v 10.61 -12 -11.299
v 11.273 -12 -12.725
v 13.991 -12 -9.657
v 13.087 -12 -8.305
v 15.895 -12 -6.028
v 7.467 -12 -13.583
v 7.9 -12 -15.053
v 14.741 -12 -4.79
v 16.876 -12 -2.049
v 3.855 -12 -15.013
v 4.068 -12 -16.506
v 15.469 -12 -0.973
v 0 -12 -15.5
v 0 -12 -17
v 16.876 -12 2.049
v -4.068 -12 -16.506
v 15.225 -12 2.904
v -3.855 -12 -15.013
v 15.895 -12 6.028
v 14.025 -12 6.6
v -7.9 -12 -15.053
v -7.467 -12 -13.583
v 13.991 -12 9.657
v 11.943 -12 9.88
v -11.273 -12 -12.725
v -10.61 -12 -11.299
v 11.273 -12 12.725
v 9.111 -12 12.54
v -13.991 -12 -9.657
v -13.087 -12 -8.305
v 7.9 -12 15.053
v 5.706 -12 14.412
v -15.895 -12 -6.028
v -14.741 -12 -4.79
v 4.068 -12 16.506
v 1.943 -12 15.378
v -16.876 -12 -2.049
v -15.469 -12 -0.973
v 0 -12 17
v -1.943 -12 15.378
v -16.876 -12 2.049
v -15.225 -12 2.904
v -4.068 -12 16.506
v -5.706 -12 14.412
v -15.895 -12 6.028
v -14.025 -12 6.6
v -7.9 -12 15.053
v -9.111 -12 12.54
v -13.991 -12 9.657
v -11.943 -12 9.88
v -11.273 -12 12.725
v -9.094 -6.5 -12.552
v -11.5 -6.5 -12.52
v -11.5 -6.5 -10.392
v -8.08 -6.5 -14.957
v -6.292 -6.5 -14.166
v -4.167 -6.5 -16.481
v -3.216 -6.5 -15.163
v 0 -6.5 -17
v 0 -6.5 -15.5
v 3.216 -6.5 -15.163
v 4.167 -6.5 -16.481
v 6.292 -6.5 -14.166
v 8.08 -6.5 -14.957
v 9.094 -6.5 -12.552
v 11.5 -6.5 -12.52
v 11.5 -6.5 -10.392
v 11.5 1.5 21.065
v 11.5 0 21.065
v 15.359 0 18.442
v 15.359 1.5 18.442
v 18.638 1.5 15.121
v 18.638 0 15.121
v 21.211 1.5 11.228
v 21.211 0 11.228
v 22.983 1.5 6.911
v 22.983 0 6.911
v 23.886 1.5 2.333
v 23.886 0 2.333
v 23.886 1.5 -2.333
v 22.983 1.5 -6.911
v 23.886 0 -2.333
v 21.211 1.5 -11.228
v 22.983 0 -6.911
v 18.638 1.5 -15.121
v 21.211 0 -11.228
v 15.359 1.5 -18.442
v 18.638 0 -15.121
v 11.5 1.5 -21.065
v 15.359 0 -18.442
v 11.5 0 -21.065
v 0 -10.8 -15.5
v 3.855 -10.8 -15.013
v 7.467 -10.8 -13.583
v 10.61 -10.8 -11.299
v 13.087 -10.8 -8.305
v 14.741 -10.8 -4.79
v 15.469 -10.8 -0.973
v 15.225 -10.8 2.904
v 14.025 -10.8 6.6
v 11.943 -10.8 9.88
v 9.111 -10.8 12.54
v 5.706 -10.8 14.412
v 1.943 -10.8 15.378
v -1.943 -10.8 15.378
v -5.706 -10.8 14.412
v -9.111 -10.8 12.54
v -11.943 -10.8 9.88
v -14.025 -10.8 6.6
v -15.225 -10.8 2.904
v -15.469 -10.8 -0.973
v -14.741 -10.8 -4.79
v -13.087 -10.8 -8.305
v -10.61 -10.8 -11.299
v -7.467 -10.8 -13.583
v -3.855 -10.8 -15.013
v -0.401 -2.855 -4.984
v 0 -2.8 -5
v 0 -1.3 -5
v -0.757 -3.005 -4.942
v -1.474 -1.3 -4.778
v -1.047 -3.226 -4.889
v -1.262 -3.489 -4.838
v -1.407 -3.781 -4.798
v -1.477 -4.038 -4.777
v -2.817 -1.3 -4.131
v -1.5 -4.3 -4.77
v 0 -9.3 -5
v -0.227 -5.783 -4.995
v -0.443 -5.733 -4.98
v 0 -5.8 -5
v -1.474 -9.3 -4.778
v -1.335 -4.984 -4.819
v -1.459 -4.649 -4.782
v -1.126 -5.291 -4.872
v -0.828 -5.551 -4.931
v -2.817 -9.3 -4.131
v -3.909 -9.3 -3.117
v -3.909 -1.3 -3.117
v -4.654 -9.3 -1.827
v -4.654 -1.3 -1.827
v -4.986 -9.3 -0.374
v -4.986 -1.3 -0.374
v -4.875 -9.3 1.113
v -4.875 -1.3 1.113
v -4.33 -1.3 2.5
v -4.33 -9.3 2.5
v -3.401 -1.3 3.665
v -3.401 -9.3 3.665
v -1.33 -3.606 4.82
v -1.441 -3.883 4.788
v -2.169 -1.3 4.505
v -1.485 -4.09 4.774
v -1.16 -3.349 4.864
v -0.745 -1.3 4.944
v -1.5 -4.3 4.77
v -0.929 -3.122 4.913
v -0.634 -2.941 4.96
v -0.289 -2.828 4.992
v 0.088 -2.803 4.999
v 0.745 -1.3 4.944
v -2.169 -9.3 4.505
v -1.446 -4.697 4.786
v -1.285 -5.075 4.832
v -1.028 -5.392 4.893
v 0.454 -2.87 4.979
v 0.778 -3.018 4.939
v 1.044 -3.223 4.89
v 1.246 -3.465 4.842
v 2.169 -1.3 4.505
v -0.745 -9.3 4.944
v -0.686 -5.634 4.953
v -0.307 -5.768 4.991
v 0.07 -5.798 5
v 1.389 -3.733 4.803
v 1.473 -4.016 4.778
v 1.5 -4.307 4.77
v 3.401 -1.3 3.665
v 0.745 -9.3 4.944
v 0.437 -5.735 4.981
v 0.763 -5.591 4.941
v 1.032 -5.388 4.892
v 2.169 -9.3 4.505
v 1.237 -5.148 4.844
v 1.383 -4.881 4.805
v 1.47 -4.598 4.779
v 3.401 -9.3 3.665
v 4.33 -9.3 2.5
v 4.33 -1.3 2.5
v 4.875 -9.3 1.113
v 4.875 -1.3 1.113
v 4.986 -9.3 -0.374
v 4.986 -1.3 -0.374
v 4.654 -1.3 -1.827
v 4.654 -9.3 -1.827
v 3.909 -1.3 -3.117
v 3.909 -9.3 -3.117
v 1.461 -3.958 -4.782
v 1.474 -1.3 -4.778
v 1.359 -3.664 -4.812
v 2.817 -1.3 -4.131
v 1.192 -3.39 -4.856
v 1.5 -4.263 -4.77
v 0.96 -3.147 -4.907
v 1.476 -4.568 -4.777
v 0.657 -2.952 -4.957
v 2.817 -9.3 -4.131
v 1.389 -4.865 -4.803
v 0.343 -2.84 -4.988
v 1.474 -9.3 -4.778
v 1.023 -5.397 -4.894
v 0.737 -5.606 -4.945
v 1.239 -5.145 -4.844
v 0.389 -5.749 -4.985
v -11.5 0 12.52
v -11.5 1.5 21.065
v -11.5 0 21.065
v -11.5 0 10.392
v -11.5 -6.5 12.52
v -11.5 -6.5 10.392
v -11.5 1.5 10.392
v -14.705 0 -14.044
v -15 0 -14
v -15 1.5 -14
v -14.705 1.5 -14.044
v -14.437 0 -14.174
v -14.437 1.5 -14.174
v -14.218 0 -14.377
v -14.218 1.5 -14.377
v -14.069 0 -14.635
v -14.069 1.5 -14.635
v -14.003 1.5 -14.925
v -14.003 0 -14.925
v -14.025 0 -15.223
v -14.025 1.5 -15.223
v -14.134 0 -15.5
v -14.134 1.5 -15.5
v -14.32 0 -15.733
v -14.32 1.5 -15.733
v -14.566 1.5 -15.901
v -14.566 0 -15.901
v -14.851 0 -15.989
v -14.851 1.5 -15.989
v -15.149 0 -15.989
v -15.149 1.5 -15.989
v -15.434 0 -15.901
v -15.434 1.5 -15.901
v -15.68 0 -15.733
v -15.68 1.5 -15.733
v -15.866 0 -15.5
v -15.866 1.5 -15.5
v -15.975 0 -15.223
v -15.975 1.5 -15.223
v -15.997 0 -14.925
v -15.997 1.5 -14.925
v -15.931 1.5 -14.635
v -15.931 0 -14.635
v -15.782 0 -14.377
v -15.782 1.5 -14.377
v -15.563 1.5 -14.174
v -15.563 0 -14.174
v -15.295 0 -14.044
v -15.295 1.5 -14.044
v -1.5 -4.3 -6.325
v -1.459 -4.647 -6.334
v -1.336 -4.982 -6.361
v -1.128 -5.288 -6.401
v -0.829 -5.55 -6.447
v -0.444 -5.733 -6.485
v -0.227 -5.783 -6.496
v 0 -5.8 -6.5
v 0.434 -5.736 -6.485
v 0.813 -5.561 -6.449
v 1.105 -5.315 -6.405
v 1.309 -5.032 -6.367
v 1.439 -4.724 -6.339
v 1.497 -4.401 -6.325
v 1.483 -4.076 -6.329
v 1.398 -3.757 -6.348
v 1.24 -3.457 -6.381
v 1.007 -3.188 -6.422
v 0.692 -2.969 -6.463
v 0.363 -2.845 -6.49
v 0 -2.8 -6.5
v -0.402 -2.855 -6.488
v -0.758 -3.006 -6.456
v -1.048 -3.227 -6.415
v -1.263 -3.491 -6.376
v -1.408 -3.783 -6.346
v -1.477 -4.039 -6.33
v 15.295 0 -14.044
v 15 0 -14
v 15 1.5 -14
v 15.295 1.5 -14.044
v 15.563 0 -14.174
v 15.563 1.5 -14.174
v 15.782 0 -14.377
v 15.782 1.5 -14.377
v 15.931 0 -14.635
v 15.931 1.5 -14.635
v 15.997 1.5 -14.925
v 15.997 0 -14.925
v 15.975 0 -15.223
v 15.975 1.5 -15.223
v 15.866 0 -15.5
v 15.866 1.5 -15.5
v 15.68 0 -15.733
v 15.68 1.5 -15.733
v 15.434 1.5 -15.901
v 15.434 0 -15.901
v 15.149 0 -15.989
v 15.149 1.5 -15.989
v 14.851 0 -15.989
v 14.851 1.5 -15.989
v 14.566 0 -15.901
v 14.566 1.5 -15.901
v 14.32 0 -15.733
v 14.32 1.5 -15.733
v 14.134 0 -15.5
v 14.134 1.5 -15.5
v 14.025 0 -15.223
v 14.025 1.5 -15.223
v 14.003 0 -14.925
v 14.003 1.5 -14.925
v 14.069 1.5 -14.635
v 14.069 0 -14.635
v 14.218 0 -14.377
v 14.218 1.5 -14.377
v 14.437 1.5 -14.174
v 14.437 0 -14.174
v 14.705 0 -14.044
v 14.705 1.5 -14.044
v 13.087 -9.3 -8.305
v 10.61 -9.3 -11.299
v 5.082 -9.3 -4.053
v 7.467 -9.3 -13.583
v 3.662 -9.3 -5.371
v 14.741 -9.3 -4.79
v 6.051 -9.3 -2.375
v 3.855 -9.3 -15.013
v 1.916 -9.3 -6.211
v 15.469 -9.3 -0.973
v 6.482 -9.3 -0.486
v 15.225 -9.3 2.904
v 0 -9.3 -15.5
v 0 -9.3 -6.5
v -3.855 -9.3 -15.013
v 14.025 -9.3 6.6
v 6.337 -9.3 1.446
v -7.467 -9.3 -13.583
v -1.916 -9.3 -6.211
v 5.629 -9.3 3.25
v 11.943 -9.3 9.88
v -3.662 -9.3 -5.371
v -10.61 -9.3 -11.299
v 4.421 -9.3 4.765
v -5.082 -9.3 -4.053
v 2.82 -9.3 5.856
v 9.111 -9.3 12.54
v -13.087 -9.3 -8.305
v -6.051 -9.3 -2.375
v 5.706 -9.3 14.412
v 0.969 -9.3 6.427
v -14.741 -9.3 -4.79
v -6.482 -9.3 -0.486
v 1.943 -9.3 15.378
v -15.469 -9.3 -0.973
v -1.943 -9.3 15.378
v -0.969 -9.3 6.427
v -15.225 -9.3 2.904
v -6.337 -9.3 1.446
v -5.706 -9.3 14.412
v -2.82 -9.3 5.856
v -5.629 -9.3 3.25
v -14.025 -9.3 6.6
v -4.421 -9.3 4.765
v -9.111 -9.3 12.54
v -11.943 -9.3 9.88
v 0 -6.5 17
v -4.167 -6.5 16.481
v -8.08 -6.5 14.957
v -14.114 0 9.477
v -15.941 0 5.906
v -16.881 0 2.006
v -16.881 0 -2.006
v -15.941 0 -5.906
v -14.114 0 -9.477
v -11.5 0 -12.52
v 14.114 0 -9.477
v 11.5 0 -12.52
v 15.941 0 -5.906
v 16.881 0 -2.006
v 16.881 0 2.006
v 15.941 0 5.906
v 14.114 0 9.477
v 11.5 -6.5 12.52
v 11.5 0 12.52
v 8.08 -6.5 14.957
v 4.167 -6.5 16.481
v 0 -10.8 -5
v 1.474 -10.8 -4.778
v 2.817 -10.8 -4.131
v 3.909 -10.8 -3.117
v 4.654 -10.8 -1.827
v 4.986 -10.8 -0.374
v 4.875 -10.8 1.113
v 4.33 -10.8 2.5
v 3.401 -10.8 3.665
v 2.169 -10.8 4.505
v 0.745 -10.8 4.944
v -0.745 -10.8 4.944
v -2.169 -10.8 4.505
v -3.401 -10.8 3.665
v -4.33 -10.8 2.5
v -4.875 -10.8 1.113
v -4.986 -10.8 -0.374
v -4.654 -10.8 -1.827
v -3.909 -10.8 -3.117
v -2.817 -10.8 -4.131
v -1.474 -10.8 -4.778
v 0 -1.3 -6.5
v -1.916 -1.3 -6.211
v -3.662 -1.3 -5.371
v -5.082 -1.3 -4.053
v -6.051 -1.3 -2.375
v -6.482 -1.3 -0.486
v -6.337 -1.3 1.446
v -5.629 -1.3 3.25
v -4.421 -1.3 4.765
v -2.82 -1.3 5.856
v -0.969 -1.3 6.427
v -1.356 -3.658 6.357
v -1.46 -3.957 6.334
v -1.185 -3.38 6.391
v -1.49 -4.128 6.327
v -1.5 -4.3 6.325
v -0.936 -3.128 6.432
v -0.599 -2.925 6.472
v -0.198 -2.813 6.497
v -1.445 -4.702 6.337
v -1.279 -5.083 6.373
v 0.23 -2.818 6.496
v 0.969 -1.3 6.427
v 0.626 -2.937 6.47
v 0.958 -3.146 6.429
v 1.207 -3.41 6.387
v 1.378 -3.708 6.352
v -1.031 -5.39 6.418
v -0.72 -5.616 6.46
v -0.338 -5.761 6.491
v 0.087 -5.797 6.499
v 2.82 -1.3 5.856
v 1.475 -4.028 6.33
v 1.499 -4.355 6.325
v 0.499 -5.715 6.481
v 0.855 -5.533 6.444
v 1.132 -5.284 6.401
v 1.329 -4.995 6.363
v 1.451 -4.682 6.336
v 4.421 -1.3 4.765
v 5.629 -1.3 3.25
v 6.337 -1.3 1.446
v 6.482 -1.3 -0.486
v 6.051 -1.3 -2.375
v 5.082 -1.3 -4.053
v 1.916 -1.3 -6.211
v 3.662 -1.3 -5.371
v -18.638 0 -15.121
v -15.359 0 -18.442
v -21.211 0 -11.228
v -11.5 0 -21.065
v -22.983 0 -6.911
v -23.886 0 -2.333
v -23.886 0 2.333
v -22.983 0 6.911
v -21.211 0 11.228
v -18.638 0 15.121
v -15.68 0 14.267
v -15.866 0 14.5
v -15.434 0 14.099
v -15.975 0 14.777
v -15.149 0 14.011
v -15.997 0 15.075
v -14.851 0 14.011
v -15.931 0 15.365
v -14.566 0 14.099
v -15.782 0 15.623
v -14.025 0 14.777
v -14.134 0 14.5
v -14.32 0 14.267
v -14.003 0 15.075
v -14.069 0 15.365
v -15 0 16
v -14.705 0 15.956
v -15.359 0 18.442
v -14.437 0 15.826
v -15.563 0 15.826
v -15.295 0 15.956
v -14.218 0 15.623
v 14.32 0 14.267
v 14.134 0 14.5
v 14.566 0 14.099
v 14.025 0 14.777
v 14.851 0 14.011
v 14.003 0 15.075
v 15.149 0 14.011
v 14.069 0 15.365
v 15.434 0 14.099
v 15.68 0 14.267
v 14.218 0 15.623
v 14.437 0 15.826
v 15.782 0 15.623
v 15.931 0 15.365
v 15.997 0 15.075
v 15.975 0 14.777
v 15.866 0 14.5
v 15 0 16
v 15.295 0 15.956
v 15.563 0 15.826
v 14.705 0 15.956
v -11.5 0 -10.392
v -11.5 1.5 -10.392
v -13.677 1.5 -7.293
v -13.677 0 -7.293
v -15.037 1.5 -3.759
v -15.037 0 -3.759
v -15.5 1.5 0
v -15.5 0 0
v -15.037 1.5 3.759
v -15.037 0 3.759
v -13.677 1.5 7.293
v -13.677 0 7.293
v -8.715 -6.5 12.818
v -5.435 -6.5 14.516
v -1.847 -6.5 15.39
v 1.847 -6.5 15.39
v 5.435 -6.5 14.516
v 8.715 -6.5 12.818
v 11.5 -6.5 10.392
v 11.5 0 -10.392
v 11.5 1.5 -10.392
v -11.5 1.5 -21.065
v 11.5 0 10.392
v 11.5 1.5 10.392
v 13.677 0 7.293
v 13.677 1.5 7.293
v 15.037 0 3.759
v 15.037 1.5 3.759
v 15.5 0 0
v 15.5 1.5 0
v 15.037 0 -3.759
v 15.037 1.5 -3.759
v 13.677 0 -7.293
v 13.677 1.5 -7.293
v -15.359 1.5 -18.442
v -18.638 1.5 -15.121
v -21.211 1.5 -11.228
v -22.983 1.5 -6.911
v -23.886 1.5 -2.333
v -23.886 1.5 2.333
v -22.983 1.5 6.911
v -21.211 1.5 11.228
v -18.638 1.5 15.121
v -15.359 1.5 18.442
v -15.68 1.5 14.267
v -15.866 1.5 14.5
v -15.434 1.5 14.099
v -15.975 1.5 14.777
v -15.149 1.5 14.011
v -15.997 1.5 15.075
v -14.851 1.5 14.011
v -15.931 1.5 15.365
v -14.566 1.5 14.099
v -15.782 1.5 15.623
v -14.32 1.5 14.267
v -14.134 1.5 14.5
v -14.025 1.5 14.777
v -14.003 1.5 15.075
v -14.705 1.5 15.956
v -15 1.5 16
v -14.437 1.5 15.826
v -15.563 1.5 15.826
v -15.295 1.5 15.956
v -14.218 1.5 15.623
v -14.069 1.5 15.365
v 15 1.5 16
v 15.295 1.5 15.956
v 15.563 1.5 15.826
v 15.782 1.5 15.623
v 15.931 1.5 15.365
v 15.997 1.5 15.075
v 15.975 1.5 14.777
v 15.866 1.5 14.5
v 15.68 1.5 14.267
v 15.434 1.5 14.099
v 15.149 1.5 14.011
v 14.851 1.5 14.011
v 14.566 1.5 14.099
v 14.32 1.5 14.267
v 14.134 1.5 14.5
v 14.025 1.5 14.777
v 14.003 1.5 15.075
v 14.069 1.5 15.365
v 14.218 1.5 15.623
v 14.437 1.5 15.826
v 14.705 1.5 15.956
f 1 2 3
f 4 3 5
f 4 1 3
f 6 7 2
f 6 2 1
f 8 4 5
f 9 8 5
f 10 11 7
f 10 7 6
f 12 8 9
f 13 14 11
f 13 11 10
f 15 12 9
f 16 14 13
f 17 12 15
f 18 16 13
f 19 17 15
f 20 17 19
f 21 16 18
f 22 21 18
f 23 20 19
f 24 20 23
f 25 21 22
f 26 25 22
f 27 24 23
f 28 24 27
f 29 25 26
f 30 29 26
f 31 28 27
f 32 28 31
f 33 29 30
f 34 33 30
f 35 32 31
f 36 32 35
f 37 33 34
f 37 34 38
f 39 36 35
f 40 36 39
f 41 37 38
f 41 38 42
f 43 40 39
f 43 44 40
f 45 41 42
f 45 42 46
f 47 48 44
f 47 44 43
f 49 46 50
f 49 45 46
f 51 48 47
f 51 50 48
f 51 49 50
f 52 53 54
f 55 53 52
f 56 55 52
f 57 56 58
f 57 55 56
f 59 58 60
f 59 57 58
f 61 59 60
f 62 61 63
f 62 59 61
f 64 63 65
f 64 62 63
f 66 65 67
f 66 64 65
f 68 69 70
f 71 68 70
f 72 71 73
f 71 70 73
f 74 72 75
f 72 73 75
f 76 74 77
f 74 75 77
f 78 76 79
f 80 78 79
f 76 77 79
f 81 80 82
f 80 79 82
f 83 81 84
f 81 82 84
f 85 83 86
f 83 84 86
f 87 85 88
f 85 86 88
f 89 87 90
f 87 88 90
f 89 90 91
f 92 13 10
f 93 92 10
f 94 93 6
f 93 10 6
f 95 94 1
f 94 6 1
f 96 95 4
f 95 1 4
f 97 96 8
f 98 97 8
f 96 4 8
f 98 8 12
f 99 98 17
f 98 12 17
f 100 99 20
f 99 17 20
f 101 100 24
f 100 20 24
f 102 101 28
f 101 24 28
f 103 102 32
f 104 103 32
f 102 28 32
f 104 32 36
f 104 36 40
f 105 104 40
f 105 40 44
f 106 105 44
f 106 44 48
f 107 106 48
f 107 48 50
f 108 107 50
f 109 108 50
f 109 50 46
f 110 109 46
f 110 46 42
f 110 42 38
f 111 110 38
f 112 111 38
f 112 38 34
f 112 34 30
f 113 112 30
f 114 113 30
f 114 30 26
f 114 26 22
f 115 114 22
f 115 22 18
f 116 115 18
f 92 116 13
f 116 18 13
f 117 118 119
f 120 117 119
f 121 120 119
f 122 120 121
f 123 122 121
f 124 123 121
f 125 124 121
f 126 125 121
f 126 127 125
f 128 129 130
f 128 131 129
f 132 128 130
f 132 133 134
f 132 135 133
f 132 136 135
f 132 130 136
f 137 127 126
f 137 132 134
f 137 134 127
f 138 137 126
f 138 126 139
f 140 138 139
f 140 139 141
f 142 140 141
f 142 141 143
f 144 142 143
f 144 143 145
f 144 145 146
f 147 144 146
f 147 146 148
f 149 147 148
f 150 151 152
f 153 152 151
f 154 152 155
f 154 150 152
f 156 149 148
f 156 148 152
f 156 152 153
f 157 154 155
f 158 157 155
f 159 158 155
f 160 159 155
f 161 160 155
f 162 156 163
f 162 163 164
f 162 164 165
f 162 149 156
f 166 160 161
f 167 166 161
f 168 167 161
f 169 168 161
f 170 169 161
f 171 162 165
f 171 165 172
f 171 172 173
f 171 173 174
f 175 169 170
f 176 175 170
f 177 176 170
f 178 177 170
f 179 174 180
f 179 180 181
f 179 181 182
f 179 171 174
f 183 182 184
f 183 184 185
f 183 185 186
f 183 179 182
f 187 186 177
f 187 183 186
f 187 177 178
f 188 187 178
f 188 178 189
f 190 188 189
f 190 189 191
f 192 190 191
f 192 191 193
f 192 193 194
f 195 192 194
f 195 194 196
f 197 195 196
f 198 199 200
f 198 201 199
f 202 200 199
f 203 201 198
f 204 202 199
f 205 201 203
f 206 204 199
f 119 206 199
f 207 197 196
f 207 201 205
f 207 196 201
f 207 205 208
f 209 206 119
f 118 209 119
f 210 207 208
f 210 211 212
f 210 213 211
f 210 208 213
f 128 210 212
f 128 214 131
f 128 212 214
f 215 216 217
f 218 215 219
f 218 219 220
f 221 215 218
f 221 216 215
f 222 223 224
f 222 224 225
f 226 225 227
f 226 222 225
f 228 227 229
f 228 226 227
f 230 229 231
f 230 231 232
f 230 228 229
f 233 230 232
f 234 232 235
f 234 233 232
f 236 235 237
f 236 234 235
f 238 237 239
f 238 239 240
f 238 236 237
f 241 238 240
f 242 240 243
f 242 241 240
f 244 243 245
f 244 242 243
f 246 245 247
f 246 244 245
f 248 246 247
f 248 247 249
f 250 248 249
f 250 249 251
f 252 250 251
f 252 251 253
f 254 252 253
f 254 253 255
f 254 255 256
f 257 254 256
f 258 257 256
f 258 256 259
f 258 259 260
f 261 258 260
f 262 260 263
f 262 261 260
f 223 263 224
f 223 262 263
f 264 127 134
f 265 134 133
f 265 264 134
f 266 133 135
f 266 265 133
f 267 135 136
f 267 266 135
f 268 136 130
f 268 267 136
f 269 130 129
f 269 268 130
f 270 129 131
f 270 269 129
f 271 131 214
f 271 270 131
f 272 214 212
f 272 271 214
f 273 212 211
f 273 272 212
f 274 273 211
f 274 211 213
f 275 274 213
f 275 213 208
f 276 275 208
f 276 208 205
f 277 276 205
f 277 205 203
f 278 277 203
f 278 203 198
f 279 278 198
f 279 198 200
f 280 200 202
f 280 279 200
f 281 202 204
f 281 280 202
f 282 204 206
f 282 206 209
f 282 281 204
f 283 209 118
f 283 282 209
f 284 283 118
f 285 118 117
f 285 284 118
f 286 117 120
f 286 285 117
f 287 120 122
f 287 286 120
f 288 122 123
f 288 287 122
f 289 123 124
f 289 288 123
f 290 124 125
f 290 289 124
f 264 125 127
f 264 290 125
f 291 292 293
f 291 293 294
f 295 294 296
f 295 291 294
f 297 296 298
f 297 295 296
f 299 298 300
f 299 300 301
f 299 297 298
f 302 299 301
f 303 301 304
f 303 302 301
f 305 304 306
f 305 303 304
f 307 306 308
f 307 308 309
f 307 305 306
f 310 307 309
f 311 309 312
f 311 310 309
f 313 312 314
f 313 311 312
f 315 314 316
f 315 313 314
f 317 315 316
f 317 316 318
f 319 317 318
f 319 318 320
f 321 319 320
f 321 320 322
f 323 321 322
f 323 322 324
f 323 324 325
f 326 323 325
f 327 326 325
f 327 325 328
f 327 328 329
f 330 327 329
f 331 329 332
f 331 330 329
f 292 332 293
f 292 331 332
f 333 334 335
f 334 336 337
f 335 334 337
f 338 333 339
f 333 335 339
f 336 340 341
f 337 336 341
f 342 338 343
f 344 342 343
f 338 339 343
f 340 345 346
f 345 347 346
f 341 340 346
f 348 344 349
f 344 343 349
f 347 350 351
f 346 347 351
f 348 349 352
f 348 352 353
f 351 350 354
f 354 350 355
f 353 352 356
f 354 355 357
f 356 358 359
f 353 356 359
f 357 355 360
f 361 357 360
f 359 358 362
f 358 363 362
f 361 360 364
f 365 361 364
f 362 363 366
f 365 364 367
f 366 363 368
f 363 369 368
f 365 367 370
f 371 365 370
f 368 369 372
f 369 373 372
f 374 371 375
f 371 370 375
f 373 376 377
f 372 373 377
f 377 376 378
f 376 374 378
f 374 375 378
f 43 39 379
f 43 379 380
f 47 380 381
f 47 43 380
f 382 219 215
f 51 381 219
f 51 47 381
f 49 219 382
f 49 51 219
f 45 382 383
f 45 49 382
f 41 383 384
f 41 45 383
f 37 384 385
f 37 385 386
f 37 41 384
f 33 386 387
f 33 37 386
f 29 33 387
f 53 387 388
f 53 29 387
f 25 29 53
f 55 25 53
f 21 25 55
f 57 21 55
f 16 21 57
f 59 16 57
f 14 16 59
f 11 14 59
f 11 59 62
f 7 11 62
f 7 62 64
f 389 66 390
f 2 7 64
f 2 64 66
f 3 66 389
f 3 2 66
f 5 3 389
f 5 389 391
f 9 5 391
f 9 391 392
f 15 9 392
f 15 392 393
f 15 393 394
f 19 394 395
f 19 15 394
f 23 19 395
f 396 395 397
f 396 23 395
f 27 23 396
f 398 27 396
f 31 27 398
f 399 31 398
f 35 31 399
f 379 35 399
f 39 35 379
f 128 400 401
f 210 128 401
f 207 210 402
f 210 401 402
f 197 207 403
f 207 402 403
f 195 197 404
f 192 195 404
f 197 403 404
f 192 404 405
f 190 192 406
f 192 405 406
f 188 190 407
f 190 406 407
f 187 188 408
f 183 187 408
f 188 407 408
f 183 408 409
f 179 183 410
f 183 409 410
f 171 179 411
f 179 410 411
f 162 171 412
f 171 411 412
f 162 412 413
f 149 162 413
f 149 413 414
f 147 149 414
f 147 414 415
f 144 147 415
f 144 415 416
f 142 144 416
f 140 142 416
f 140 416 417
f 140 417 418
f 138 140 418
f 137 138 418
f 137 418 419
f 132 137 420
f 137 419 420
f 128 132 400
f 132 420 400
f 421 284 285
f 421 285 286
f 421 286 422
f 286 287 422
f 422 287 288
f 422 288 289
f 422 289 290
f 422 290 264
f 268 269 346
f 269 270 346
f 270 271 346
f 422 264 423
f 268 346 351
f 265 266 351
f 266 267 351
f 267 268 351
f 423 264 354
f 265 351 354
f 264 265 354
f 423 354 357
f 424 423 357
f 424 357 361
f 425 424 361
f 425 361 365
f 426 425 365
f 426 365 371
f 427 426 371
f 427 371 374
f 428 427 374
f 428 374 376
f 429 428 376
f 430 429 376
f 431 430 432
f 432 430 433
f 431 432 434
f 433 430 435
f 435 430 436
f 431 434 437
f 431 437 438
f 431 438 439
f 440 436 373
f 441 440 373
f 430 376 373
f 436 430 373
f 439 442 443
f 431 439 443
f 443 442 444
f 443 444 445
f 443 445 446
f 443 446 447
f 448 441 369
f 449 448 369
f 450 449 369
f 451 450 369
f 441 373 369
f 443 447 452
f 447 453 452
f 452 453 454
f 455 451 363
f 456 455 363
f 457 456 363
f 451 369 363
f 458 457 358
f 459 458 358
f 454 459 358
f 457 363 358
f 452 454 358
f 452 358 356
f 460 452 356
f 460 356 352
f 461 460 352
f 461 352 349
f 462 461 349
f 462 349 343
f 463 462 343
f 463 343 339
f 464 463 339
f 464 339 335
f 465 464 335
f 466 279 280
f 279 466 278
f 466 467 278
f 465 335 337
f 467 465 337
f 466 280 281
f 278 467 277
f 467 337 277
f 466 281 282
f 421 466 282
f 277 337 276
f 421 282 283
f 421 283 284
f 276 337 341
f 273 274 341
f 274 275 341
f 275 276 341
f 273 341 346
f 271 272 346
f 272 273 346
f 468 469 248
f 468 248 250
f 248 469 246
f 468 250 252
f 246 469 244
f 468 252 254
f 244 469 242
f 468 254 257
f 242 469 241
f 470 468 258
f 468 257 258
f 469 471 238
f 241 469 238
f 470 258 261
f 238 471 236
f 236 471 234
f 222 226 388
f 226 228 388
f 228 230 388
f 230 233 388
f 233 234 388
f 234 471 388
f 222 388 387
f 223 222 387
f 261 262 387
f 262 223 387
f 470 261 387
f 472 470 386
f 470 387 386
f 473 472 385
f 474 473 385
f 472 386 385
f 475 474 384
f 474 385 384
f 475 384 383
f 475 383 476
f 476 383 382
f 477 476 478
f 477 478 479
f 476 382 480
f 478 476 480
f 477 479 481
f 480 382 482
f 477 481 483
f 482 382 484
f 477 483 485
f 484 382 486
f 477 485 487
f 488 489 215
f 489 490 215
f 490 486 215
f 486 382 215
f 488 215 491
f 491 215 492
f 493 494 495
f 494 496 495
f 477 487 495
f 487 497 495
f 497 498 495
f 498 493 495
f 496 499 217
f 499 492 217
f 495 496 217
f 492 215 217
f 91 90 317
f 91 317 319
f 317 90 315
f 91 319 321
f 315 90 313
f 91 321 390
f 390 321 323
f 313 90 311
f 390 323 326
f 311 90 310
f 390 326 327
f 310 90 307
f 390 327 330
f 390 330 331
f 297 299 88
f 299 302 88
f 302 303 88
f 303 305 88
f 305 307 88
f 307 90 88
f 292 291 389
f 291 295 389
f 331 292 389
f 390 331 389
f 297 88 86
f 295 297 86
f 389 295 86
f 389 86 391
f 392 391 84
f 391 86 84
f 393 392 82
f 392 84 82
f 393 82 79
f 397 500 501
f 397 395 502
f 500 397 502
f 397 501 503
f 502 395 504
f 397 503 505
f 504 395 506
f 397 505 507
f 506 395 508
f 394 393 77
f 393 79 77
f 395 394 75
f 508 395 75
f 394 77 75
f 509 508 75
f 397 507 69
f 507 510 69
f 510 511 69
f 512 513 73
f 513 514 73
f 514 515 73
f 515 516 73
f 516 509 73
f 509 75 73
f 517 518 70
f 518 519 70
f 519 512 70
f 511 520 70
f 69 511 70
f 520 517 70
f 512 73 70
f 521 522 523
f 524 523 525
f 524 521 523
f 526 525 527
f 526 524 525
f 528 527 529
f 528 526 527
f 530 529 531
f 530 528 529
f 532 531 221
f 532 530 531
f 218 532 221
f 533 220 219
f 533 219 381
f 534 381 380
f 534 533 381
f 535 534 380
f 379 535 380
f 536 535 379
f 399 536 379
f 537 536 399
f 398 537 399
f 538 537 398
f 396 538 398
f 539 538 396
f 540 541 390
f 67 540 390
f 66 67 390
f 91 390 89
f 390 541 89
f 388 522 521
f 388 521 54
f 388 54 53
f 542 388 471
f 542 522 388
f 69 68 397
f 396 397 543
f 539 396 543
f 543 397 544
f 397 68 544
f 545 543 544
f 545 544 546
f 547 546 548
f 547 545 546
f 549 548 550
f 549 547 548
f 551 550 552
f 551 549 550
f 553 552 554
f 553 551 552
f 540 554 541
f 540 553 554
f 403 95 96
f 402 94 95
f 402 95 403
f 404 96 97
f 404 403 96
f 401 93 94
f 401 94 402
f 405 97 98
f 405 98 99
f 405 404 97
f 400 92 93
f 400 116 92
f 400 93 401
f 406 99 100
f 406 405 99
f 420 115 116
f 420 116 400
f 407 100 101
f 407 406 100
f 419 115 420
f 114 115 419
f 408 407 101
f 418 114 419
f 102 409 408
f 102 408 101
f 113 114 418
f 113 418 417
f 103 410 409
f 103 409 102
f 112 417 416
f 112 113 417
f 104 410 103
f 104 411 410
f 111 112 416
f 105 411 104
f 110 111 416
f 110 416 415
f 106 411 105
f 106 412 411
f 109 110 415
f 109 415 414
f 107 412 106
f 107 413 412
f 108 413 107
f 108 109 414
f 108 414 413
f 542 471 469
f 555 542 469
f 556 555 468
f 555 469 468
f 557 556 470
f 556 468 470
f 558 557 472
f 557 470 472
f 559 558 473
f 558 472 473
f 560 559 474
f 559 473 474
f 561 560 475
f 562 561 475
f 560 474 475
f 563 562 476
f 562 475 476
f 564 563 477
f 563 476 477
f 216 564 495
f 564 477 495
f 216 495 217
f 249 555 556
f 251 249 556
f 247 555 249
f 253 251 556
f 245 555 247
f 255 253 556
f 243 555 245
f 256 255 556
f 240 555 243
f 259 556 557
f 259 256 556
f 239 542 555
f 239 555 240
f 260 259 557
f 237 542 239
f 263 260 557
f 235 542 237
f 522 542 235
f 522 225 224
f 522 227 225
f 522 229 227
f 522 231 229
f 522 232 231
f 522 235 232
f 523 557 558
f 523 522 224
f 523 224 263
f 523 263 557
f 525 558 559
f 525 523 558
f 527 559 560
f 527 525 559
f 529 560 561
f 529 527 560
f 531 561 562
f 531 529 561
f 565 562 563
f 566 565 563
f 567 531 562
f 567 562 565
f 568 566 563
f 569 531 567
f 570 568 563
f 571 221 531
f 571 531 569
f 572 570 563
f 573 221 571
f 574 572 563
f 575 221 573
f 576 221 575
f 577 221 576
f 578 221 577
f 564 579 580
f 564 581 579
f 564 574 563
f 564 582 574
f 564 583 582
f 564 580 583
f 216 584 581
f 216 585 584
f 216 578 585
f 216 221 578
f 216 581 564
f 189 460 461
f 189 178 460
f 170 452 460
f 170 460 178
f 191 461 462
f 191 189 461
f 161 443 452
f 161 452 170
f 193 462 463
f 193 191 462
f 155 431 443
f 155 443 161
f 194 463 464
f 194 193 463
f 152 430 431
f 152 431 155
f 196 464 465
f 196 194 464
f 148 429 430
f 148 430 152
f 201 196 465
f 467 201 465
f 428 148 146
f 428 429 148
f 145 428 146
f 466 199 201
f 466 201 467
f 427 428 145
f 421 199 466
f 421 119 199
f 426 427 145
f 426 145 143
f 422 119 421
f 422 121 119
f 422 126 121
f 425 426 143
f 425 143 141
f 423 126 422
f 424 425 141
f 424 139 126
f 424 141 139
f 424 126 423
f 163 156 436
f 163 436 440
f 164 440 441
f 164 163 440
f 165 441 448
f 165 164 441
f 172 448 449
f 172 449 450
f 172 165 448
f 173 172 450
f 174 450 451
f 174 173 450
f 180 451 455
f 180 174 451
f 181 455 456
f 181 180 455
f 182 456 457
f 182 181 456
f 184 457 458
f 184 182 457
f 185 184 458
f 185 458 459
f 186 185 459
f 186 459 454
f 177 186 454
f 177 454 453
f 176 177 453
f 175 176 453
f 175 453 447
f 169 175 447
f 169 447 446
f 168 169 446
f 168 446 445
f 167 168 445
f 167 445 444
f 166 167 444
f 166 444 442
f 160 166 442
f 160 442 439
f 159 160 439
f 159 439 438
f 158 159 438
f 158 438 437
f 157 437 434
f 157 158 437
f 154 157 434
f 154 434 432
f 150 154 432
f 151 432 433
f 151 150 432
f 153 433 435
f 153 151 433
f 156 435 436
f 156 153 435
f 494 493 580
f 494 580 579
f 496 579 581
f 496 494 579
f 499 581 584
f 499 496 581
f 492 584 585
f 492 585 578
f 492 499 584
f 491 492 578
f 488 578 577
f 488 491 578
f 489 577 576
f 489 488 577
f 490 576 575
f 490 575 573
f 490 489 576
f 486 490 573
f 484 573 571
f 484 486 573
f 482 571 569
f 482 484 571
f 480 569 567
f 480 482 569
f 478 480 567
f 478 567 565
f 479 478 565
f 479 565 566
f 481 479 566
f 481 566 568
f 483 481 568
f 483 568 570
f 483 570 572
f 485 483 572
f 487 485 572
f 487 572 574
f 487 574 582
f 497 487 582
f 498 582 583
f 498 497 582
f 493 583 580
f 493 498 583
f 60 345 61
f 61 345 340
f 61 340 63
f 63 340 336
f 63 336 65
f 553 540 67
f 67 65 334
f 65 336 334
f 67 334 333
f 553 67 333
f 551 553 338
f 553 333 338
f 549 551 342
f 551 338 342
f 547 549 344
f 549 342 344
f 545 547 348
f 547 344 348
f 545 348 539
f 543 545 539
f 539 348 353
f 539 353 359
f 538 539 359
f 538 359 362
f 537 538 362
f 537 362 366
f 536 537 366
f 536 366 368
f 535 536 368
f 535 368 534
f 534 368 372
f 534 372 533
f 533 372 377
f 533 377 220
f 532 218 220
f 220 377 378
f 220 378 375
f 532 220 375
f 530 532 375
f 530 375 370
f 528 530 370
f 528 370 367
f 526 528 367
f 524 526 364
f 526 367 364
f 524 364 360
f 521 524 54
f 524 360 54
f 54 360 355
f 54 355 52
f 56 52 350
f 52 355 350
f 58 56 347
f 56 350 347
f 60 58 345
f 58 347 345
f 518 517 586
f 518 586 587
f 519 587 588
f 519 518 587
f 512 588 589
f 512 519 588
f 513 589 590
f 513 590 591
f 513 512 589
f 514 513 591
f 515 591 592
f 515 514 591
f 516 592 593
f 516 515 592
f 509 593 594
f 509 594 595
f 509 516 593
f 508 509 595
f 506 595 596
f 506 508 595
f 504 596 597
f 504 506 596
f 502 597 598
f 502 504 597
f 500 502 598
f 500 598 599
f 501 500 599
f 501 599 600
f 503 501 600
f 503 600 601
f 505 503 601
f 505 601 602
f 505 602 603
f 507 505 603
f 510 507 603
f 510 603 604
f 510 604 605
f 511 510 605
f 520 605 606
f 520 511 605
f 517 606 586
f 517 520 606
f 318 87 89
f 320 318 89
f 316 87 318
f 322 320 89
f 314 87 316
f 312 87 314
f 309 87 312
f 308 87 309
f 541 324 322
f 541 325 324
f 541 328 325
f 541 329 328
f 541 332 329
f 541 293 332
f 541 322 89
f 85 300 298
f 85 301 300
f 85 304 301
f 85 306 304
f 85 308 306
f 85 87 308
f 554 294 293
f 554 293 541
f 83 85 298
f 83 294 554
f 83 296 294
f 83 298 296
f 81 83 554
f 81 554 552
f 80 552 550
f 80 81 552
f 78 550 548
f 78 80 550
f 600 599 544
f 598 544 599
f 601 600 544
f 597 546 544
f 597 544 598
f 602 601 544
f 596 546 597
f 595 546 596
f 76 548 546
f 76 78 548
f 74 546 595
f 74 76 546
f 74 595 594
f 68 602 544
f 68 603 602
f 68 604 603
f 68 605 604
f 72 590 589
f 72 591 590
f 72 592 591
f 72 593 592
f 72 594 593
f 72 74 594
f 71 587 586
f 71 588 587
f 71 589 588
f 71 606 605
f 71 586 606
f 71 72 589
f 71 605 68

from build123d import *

# Parameters (mm, degrees)
SKETCH_2_R               = 24
SKETCH_2_R_2             = 15.5
SKETCH_2_R_3             = 1
EXTRUDE_1_DEPTH          = 1.5
EXTRUDE_START            = 12
SKETCH_4_R               = 17
SKETCH_4_R_2             = 15.5
EXTRUDE_3_DEPTH          = 12
EXTRUDE_START_2          = -1.2
SKETCH_5_R               = 17
SKETCH_5_R_2             = 5
EXTRUDE_4_DEPTH          = 1.5
SKETCH_6_W               = 23
SKETCH_6_H               = 48
CUT_EXTRUDE_1_DEPTH      = 8
SKETCH_7_R               = 6.5
SKETCH_7_R_2             = 5
EXTRUDE_5_DEPTH          = 8
CUT_EXTRUDE_2_DEPTH      = 10
CUT_EXTRUDE_2_DEPTH_BACK = 10
SKETCH_8_R               = 1.5


with BuildPart() as part:
    # 草图2 → 凸台-拉伸1 (new body)
    with BuildSketch(Plane(origin=(0, 0, 0), x_dir=(1, 0, 0), z_dir=(0, 1, 0))):
        Circle(SKETCH_2_R)
        Circle(SKETCH_2_R_2, mode=Mode.SUBTRACT)
        with Locations((-15, 15)):
            Circle(SKETCH_2_R_3, mode=Mode.SUBTRACT)
        with Locations((15, 15)):
            Circle(SKETCH_2_R_3, mode=Mode.SUBTRACT)
        with Locations((-15, -15)):
            Circle(SKETCH_2_R_3, mode=Mode.SUBTRACT)
        with Locations((15, -15)):
            Circle(SKETCH_2_R_3, mode=Mode.SUBTRACT)
    extrude(amount=EXTRUDE_1_DEPTH)

    # 草图4 → 凸台-拉伸3 (add)
    with BuildSketch(Plane.XZ.offset(EXTRUDE_START)):
        Circle(SKETCH_4_R)
        Circle(SKETCH_4_R_2, mode=Mode.SUBTRACT)
    extrude(amount=-EXTRUDE_3_DEPTH)

    # 草图5 → 凸台-拉伸4 (add)
    with BuildSketch(Plane.XZ.offset(12).offset(EXTRUDE_START_2)):
        Circle(SKETCH_5_R)
        Circle(SKETCH_5_R_2, mode=Mode.SUBTRACT)
    extrude(amount=-EXTRUDE_4_DEPTH)

    # 草图6 → 切除-拉伸1 (cut)
    with BuildSketch(Plane(origin=(0, 1.5, 0), x_dir=(1, 0, 0), z_dir=(0, 1, 0))):
        Rectangle(SKETCH_6_W, SKETCH_6_H)
    extrude(amount=-CUT_EXTRUDE_1_DEPTH, mode=Mode.SUBTRACT)

    # 草图7 → 凸台-拉伸5 (add)
    with BuildSketch(Plane(origin=(0, -9.3, 0), x_dir=(1, 0, 0), z_dir=(0, 1, 0))):
        Circle(SKETCH_7_R)
        Circle(SKETCH_7_R_2, mode=Mode.SUBTRACT)
    extrude(amount=EXTRUDE_5_DEPTH)

    # 草图8 → 切除-拉伸2 (cut, two sides: drawn at the far end of the back side and taken through both)
    with BuildSketch(Plane.XY.offset(-CUT_EXTRUDE_2_DEPTH_BACK)):
        with Locations((0, -4.3)):
            Circle(SKETCH_8_R)
    extrude(amount=CUT_EXTRUDE_2_DEPTH + CUT_EXTRUDE_2_DEPTH_BACK, mode=Mode.SUBTRACT)


solid = part.part
